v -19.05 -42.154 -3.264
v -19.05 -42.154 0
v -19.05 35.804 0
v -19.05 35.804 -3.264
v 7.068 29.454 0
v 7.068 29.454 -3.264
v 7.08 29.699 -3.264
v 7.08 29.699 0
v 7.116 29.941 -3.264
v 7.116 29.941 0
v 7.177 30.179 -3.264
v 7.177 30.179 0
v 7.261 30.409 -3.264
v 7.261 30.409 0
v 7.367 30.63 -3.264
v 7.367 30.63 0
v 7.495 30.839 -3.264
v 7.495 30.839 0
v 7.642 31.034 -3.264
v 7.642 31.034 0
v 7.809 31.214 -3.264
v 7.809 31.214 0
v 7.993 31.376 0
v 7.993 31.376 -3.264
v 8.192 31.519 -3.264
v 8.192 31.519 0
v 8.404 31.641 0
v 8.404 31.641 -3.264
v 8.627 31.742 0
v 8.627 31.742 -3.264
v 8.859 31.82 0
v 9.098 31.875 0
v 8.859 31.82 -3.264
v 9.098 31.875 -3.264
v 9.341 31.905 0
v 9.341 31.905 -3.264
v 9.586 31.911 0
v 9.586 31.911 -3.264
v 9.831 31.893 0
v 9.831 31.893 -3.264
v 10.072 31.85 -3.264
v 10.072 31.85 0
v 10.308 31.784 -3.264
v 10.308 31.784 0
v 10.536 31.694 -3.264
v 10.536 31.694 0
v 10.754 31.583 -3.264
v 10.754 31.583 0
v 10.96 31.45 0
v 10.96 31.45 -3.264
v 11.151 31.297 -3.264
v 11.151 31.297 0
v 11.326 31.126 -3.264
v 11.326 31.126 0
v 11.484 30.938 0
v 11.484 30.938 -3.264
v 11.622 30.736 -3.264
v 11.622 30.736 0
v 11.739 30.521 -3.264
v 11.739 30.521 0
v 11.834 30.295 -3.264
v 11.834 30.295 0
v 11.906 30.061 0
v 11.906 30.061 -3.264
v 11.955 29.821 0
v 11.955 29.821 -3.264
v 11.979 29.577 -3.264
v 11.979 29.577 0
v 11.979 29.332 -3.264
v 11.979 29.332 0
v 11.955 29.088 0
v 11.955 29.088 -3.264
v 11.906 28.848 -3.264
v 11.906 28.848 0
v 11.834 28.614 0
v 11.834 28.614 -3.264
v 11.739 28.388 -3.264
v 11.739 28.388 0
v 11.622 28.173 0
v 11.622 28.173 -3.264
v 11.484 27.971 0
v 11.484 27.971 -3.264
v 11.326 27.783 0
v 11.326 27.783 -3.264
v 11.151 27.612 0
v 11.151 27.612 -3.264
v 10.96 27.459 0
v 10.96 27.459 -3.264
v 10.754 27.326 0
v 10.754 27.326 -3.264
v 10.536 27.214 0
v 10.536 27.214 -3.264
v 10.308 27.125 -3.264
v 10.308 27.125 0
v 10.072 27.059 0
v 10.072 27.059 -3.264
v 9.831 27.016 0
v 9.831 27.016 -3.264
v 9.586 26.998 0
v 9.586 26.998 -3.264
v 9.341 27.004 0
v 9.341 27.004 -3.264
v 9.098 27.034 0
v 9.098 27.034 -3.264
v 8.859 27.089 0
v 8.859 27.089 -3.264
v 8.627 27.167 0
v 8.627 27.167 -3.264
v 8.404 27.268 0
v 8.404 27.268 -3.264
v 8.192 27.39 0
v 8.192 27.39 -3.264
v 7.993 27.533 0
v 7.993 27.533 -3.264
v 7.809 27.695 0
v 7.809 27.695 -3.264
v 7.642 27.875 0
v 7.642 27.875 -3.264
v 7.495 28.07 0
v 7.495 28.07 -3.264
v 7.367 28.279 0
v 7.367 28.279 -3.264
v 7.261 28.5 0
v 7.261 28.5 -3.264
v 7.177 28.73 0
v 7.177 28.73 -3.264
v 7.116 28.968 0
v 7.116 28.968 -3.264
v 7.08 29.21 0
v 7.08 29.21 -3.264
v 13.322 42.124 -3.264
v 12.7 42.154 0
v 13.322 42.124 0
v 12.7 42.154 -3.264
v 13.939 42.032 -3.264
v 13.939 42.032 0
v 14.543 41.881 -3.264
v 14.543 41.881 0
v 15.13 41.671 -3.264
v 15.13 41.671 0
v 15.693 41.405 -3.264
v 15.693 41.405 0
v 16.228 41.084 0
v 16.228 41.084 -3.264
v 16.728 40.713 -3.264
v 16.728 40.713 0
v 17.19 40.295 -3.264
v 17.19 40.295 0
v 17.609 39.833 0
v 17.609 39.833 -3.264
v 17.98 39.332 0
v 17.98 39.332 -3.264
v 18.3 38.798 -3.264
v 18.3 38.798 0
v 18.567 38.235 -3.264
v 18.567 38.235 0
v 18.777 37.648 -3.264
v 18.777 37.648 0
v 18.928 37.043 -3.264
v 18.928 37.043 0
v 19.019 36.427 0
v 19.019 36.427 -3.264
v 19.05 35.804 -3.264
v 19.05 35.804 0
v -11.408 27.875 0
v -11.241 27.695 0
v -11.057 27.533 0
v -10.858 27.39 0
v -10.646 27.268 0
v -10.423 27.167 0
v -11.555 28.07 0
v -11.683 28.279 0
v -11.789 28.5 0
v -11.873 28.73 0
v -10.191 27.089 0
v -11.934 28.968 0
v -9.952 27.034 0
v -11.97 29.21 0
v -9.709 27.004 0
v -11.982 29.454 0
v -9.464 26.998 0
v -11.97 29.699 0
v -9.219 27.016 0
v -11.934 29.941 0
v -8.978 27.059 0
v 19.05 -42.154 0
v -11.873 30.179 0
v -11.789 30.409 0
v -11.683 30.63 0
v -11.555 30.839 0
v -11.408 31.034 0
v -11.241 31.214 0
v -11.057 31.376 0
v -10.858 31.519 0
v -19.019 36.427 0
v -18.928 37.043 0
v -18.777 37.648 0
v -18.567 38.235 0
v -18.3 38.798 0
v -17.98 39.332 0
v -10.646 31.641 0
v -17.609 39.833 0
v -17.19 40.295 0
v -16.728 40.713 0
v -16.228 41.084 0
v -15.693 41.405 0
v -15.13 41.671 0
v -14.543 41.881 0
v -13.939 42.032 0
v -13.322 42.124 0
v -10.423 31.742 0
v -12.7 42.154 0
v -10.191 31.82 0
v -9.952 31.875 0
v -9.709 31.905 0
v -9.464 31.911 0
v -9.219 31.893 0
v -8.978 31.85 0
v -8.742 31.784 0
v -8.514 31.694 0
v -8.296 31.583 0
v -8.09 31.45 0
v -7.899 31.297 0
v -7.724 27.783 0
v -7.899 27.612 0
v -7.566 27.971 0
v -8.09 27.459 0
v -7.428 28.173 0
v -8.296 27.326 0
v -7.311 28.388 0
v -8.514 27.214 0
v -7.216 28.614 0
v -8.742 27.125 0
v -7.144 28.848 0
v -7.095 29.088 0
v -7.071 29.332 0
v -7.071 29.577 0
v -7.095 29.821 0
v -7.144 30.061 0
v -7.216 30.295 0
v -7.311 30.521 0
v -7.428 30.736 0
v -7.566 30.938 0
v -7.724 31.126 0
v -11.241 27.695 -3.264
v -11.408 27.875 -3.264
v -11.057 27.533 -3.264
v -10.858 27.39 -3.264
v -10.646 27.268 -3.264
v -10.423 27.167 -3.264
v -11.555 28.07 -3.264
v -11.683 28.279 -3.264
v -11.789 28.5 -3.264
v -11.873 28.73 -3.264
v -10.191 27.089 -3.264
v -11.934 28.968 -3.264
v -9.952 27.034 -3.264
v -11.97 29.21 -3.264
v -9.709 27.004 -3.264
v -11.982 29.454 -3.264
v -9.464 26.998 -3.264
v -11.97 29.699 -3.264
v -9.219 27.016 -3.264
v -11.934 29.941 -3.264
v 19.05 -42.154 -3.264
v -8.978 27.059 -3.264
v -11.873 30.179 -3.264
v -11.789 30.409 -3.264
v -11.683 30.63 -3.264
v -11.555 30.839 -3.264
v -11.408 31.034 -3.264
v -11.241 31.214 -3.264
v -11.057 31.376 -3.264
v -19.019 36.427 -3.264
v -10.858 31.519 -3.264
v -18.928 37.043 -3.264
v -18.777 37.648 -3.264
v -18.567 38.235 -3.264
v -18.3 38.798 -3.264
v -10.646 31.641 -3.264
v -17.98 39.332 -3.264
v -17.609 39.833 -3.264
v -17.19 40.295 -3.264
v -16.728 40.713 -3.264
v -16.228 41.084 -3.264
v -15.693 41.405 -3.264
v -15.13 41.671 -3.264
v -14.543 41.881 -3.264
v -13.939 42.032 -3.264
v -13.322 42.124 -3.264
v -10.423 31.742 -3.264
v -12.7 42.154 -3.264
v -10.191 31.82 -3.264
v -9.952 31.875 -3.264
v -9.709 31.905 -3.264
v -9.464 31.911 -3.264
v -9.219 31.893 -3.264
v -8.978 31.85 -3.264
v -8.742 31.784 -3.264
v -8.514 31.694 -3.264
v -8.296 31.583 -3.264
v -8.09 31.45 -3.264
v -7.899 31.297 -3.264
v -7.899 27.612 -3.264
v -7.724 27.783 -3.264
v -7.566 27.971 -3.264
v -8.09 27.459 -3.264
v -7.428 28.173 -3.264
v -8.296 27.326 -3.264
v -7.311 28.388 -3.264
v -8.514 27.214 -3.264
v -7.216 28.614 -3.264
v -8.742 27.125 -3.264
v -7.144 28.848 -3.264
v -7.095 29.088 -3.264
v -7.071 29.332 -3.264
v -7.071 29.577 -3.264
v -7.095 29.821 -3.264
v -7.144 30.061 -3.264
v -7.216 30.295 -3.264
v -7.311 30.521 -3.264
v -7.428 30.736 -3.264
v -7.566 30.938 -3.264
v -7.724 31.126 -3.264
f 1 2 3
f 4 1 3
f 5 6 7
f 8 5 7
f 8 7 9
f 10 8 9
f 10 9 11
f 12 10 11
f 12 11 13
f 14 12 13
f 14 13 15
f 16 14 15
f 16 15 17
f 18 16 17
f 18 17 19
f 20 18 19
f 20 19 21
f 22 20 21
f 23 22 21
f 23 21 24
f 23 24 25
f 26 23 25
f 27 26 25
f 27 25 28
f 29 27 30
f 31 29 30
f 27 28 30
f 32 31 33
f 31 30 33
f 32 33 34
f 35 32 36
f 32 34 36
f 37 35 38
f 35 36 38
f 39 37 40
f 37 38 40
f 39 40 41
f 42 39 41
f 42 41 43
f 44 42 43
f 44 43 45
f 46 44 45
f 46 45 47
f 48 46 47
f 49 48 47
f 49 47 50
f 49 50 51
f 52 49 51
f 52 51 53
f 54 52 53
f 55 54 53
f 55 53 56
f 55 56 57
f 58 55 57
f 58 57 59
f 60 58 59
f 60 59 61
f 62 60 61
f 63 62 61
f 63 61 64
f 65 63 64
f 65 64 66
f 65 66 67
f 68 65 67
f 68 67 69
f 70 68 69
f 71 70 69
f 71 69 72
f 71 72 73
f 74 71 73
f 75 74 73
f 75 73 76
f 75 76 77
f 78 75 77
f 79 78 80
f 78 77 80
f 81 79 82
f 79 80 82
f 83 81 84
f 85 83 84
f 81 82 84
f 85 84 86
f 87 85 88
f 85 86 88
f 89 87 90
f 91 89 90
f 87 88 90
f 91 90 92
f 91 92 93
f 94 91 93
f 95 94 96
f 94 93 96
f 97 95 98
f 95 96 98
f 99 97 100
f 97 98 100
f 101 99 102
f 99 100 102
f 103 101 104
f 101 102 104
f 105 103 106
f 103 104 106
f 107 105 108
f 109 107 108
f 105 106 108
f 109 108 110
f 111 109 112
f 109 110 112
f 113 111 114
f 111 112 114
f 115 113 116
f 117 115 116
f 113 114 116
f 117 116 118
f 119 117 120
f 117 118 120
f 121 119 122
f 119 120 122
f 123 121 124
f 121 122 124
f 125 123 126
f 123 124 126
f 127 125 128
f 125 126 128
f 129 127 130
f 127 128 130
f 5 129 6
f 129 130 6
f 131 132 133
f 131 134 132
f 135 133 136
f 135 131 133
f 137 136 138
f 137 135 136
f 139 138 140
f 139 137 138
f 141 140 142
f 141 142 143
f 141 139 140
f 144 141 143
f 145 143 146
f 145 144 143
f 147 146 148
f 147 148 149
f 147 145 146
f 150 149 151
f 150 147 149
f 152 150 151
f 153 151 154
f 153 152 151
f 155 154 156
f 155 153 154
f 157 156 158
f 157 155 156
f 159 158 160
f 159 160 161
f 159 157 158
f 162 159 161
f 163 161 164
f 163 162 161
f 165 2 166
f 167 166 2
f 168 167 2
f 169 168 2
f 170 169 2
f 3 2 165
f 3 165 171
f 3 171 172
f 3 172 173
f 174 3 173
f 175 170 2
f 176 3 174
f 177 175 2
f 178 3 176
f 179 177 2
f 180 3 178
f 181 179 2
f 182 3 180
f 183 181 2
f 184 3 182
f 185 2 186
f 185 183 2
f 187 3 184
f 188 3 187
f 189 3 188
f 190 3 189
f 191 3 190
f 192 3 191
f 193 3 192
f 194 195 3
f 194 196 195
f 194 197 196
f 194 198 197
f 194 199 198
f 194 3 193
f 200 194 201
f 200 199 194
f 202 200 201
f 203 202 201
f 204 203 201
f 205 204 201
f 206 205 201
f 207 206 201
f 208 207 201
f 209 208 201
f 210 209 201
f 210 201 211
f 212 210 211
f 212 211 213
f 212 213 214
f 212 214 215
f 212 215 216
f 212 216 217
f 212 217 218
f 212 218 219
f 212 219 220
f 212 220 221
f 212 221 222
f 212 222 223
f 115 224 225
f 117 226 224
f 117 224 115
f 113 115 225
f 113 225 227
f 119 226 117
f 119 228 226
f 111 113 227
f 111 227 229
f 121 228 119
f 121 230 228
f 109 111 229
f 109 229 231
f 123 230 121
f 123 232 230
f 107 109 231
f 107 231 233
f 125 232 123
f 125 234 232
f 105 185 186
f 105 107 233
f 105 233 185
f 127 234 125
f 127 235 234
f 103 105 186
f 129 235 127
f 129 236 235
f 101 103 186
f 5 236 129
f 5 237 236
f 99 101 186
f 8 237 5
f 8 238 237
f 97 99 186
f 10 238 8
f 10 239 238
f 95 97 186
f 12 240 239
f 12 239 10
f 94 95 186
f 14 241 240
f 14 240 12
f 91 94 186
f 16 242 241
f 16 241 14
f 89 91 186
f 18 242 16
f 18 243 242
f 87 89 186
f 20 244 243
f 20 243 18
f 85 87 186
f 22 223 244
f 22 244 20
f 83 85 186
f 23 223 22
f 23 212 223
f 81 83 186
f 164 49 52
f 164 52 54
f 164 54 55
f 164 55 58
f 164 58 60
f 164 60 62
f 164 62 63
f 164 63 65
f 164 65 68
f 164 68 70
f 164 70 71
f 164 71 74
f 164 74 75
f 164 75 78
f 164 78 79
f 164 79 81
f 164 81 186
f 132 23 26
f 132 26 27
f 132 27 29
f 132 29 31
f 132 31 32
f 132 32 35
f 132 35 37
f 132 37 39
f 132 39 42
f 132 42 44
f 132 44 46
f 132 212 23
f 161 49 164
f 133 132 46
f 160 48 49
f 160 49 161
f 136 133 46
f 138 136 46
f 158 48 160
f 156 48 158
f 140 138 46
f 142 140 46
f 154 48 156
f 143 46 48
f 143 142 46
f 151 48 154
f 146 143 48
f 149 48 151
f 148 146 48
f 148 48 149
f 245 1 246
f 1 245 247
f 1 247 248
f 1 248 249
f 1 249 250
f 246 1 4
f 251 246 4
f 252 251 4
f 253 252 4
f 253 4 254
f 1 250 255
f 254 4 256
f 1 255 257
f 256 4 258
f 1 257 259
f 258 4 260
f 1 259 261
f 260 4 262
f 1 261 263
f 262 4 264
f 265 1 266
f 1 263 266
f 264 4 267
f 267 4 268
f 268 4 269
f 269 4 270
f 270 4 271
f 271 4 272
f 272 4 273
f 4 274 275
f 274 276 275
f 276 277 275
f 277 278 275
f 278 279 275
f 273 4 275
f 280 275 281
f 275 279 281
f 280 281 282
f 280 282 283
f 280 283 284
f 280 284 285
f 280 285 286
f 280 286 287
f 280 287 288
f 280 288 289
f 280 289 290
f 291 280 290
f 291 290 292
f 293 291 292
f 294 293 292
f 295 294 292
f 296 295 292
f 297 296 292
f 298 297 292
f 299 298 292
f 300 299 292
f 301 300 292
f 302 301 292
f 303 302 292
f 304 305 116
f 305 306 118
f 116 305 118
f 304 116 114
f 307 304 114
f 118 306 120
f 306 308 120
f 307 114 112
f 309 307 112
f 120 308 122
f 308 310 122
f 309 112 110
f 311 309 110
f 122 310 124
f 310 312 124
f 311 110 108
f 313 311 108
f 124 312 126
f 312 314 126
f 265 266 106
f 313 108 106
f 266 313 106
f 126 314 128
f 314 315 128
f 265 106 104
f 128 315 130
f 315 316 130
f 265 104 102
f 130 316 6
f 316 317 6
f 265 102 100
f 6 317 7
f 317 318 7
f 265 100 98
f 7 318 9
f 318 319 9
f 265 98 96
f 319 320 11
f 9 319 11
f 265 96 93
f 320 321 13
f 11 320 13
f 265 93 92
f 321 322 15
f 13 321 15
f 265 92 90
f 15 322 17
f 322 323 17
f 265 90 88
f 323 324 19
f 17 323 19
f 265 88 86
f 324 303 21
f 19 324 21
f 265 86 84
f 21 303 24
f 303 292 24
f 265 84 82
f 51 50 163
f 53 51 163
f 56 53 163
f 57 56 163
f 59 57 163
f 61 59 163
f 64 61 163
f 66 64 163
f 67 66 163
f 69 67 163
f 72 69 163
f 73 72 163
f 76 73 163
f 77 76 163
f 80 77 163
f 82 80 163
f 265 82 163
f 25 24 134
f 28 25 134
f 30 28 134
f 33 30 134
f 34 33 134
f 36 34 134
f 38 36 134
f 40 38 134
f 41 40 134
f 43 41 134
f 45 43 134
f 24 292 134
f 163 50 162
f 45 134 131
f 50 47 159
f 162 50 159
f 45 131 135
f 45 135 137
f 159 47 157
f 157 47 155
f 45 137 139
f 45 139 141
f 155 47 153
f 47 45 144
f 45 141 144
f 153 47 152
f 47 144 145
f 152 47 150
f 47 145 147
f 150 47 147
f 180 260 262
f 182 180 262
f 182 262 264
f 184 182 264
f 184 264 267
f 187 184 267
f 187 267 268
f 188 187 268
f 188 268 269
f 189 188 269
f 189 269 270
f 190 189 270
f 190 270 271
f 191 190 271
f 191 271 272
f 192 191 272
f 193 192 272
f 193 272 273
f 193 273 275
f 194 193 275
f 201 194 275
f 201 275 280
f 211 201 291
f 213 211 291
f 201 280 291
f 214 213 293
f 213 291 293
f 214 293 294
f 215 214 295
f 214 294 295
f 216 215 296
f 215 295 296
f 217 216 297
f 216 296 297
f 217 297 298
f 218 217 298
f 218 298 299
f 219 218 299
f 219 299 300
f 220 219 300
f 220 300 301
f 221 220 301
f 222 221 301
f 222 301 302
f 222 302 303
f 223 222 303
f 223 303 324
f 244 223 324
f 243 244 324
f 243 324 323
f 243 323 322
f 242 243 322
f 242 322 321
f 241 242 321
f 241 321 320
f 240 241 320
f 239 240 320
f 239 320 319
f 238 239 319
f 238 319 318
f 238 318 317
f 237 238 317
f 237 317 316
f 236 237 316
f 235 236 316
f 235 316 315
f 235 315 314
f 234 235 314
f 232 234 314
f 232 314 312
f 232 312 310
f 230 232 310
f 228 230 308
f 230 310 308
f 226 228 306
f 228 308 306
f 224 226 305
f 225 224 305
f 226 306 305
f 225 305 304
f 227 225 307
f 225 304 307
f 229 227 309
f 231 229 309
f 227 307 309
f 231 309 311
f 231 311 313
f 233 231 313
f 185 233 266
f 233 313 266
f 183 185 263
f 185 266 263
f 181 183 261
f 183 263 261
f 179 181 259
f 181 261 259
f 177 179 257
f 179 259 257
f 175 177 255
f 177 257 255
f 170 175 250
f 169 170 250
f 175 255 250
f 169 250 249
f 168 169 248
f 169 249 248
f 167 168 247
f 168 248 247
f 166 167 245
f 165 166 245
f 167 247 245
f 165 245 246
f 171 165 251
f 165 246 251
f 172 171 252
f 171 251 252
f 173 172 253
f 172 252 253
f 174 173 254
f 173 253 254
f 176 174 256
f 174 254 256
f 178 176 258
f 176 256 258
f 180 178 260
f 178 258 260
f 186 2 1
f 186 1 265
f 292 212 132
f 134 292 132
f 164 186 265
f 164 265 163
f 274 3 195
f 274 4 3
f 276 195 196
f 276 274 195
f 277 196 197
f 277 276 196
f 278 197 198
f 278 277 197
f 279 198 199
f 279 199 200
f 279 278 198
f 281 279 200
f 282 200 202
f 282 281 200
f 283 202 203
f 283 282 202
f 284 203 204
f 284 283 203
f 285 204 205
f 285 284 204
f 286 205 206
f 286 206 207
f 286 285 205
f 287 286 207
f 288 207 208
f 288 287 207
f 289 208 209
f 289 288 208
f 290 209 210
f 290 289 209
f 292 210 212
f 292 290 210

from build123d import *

# Parameters (mm, degrees)
SKETCH1_W                    = 38.1
SKETCH1_H                    = 84.30895
BASE_FLANGE1_DEPTH           = 3.2639
F_10_0_1935_DIAMETER_HOLE1_D = 4.9149
FILLET1_R                    = 6.35


# Sheet-metal steps are written as plain solids
with BuildPart() as part:
    # Sketch1 → Base-Flange1 (new body)
    with BuildSketch(Plane.XY):
        Rectangle(SKETCH1_W, SKETCH1_H)
    extrude(amount=-BASE_FLANGE1_DEPTH)

    # #10 (0.1935) Diameter Hole1 (through all)
    with Locations(Plane.XY):
        with Locations((-9.525, 29.454475), (9.525, 29.454475)):
            Hole(F_10_0_1935_DIAMETER_HOLE1_D / 2)

    # Fillet1
    fillet1_edges = [part.edges().sort_by_distance(p)[0] for p in [
        (-19.05, 42.154475, -1.63195),
        (19.05, 42.154475, -1.63195),
    ]]
    fillet(fillet1_edges, radius=FILLET1_R)


solid = part.part
